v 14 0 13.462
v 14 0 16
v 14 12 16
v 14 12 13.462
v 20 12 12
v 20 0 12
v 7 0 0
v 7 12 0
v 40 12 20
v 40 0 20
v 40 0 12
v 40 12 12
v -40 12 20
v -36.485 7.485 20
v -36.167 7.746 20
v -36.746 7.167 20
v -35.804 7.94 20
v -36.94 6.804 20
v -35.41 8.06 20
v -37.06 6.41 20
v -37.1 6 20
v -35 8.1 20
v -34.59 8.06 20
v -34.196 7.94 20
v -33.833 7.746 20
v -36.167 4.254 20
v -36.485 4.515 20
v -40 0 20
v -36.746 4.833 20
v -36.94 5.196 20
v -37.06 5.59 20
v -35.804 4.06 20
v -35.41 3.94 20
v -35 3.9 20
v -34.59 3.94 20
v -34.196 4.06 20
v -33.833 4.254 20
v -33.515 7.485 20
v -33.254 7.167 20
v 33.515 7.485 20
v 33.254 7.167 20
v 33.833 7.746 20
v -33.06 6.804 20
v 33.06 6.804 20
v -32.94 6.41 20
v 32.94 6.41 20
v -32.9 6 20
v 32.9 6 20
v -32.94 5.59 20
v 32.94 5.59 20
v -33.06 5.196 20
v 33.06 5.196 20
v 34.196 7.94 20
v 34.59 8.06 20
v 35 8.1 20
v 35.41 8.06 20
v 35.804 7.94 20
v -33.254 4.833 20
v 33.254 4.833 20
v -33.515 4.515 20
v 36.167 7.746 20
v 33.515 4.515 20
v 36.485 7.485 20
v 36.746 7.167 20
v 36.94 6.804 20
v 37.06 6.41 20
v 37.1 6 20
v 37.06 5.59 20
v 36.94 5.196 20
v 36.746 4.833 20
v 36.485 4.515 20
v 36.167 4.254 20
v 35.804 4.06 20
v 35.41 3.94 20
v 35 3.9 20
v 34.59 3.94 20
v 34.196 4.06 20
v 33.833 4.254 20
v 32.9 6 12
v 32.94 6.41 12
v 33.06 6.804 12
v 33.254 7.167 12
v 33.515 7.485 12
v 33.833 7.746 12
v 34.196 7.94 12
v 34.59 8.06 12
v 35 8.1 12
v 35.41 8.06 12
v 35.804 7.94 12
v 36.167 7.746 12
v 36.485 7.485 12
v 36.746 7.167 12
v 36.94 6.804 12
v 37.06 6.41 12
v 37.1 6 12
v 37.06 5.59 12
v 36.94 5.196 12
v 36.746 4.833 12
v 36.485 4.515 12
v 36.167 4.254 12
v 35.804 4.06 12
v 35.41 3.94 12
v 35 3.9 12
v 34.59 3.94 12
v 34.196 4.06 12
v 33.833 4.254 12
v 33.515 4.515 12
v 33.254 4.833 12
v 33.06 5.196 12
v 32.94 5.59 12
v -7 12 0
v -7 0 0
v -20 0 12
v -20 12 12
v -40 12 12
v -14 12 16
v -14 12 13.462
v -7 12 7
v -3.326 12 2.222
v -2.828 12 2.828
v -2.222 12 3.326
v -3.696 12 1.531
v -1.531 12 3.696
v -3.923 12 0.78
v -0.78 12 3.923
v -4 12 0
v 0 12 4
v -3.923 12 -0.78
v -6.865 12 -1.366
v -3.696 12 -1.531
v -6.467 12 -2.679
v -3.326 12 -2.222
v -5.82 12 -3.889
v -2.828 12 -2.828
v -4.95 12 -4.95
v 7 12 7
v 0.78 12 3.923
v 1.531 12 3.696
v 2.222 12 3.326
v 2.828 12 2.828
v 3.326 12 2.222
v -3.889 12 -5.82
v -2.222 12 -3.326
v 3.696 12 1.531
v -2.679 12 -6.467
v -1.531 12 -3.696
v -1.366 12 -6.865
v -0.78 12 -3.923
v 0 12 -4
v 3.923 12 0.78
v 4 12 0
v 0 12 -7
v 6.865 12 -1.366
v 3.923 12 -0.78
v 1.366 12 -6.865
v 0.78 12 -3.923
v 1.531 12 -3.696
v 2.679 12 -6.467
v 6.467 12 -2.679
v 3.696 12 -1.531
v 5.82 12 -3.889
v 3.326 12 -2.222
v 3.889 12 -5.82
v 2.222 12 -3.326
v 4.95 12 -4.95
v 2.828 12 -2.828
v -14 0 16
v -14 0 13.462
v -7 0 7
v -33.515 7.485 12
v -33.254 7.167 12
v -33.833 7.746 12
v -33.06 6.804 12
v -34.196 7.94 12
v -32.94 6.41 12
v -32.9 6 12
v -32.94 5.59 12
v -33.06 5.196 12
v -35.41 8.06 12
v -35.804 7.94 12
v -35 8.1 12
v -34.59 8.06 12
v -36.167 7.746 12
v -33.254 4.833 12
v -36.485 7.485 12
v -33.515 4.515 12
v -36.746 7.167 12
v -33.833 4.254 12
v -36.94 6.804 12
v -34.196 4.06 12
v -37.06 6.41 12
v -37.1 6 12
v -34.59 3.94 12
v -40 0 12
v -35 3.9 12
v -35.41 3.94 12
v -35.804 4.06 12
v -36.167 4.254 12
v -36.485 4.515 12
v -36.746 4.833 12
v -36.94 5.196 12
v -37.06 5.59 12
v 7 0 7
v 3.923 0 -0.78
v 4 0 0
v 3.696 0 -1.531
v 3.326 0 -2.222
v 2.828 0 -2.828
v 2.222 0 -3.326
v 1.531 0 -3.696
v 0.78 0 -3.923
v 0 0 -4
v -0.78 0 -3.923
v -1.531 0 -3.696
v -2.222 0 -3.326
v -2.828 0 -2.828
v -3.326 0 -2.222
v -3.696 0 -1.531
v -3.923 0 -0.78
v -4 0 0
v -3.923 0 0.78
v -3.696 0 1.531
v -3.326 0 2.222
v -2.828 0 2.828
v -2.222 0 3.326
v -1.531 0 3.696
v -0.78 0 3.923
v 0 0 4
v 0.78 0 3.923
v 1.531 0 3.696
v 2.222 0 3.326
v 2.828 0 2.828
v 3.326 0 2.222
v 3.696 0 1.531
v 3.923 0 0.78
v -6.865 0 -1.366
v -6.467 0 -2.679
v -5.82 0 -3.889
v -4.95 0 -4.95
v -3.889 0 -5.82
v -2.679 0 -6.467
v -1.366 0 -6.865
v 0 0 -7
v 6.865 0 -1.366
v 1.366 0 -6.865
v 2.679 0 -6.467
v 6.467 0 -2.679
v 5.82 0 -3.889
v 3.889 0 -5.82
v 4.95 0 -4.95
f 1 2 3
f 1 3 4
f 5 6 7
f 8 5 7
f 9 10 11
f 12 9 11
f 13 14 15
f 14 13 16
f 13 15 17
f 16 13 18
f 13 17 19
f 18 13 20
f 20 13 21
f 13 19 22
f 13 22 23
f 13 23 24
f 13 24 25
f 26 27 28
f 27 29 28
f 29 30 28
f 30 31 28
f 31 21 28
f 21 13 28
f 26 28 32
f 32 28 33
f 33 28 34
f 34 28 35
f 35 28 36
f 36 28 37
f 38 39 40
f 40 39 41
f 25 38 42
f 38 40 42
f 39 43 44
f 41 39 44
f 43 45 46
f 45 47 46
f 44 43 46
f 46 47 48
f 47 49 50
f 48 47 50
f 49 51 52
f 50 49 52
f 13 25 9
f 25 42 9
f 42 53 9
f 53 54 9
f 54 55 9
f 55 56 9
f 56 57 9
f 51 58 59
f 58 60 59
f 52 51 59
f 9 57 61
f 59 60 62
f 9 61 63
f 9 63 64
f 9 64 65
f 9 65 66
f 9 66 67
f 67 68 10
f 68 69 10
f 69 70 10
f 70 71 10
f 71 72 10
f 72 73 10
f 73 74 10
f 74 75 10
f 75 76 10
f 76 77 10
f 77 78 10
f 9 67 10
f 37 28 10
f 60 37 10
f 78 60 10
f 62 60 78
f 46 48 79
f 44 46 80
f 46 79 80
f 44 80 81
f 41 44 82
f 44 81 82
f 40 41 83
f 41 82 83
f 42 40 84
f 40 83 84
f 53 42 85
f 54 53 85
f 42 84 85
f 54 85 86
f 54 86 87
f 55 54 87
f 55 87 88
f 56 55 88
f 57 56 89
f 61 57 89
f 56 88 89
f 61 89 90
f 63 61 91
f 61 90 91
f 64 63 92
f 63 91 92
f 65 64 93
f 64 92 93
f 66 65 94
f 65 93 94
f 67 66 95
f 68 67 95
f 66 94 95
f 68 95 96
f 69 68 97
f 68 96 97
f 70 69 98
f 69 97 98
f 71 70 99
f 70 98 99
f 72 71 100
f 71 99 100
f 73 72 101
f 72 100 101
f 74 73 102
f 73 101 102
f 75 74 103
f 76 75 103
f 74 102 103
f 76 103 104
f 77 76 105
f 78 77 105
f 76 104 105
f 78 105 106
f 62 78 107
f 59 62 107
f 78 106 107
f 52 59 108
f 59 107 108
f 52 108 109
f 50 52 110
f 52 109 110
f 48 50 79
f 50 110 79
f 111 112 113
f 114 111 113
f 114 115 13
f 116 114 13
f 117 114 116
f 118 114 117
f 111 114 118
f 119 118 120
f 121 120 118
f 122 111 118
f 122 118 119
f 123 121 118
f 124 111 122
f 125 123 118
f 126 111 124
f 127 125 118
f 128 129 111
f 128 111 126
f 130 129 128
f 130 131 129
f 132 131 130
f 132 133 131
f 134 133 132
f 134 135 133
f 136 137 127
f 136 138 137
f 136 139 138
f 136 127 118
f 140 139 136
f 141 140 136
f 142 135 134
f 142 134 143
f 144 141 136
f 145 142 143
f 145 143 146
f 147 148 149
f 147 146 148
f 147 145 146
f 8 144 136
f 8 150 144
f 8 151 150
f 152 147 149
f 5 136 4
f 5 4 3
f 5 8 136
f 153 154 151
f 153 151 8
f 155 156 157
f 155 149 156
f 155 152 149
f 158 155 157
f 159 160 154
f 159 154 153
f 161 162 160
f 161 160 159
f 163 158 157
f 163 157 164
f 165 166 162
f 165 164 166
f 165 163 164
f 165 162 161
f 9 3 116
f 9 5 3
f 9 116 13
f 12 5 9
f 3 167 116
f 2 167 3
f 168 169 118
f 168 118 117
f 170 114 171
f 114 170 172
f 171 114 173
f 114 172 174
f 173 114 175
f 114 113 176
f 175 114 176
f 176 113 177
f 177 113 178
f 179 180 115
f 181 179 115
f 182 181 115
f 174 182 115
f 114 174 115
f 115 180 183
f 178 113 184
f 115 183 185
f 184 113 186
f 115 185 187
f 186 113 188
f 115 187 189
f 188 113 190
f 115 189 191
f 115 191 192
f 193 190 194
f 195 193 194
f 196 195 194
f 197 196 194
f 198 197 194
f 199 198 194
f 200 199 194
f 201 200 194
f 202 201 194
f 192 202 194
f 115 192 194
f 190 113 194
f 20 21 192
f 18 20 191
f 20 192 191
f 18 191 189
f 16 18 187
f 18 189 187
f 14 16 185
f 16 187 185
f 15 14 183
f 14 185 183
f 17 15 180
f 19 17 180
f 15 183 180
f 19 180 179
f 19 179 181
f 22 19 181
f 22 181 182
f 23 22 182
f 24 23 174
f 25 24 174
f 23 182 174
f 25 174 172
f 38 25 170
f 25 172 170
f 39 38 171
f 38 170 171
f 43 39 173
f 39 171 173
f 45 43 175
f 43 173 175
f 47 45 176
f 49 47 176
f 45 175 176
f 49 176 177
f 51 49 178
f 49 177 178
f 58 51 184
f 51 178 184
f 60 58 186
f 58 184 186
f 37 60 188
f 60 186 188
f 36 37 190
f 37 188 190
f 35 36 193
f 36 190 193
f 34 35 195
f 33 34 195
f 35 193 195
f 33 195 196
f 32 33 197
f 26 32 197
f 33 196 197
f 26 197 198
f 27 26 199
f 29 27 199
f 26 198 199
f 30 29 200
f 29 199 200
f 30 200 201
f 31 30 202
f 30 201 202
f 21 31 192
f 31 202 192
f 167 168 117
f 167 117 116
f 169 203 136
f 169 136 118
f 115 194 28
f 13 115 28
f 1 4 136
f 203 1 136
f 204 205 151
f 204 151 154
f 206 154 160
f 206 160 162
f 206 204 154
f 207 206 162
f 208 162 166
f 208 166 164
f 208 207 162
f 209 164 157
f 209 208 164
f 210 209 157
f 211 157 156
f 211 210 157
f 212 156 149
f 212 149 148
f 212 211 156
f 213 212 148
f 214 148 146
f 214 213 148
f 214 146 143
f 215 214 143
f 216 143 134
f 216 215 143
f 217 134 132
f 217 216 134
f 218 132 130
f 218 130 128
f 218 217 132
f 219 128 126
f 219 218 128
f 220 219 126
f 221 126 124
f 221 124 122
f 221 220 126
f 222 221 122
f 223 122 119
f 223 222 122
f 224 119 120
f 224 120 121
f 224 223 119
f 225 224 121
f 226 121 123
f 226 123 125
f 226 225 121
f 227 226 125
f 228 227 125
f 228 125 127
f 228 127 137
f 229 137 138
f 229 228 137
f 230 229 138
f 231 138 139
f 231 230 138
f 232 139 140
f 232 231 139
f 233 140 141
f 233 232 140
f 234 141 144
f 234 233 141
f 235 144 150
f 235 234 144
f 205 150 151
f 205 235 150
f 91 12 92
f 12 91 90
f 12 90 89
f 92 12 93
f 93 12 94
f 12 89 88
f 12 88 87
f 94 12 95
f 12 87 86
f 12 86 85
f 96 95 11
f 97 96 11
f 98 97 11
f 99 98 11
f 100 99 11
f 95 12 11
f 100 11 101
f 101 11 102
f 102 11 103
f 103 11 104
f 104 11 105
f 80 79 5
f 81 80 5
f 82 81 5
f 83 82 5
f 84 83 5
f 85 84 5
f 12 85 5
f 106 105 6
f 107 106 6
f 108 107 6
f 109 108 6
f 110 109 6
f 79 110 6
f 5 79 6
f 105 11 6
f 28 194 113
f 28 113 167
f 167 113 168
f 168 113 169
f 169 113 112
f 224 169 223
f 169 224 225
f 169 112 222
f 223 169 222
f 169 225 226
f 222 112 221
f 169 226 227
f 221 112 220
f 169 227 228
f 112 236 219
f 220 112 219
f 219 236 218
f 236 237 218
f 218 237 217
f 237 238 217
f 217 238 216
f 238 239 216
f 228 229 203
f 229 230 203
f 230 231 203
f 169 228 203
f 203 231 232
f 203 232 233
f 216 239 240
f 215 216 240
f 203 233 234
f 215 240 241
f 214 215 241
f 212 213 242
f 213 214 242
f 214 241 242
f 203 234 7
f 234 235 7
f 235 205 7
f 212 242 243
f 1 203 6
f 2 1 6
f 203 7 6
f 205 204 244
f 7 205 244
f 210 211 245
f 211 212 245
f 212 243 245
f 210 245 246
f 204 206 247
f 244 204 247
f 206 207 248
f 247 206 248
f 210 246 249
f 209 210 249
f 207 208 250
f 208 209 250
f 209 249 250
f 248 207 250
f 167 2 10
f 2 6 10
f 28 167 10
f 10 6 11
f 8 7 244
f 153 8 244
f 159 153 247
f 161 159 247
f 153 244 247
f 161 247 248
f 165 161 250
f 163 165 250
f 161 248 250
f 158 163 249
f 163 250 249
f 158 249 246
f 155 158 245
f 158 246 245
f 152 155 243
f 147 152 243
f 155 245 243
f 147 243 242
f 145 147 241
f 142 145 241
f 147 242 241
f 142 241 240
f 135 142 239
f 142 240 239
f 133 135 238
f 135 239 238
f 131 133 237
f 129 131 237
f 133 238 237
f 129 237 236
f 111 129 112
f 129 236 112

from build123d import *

# Parameters (mm, degrees)
SKETCH_1_R            = 4
EXTRUDE_1_DEPTH       = 12
HOLE_WIZARD_M41_D     = 4.2
HOLE_WIZARD_M41_DEPTH = 8
HOLE_WIZARD_M41_TIP   = 1.2618073


with BuildPart() as part:
    # Эскиз1 → Бобышка-Вытянуть1 (new body)
    with BuildSketch(Plane(origin=(0, 0, 0), x_dir=(1, 0, 0), z_dir=(0, 1, 0))):
        with BuildLine():
            Line((-40, -20), (40, -20))
            Line((40, -20), (40, -12))
            Line((40, -12), (20, -12))
            Line((20, -12), (7, 0))
            ThreePointArc((7, 0), (0, 7), (-7, 0))
            Line((-7, 0), (-20, -12))
            Line((-20, -12), (-40, -12))
            Line((-40, -12), (-40, -20))
        make_face()
        Circle(SKETCH_1_R, mode=Mode.SUBTRACT)
        Polygon((-14, -16), (14, -16), (14, -13.461538462), (7, -7), (-7, -7), (-14, -13.461538462), align=None, mode=Mode.SUBTRACT)
    extrude(amount=EXTRUDE_1_DEPTH)

    # Сверло под метчик  спиральное M41
    with Locations(Plane.XY.offset(20)):
        with Locations((-35, 6), (35, 6)):
            Hole(HOLE_WIZARD_M41_D / 2, depth=HOLE_WIZARD_M41_DEPTH)
            with Locations((0, 0, -(HOLE_WIZARD_M41_DEPTH + HOLE_WIZARD_M41_TIP / 2))):  # 118° drill point
                Cone(0, HOLE_WIZARD_M41_D / 2, HOLE_WIZARD_M41_TIP, mode=Mode.SUBTRACT)


solid = part.part
